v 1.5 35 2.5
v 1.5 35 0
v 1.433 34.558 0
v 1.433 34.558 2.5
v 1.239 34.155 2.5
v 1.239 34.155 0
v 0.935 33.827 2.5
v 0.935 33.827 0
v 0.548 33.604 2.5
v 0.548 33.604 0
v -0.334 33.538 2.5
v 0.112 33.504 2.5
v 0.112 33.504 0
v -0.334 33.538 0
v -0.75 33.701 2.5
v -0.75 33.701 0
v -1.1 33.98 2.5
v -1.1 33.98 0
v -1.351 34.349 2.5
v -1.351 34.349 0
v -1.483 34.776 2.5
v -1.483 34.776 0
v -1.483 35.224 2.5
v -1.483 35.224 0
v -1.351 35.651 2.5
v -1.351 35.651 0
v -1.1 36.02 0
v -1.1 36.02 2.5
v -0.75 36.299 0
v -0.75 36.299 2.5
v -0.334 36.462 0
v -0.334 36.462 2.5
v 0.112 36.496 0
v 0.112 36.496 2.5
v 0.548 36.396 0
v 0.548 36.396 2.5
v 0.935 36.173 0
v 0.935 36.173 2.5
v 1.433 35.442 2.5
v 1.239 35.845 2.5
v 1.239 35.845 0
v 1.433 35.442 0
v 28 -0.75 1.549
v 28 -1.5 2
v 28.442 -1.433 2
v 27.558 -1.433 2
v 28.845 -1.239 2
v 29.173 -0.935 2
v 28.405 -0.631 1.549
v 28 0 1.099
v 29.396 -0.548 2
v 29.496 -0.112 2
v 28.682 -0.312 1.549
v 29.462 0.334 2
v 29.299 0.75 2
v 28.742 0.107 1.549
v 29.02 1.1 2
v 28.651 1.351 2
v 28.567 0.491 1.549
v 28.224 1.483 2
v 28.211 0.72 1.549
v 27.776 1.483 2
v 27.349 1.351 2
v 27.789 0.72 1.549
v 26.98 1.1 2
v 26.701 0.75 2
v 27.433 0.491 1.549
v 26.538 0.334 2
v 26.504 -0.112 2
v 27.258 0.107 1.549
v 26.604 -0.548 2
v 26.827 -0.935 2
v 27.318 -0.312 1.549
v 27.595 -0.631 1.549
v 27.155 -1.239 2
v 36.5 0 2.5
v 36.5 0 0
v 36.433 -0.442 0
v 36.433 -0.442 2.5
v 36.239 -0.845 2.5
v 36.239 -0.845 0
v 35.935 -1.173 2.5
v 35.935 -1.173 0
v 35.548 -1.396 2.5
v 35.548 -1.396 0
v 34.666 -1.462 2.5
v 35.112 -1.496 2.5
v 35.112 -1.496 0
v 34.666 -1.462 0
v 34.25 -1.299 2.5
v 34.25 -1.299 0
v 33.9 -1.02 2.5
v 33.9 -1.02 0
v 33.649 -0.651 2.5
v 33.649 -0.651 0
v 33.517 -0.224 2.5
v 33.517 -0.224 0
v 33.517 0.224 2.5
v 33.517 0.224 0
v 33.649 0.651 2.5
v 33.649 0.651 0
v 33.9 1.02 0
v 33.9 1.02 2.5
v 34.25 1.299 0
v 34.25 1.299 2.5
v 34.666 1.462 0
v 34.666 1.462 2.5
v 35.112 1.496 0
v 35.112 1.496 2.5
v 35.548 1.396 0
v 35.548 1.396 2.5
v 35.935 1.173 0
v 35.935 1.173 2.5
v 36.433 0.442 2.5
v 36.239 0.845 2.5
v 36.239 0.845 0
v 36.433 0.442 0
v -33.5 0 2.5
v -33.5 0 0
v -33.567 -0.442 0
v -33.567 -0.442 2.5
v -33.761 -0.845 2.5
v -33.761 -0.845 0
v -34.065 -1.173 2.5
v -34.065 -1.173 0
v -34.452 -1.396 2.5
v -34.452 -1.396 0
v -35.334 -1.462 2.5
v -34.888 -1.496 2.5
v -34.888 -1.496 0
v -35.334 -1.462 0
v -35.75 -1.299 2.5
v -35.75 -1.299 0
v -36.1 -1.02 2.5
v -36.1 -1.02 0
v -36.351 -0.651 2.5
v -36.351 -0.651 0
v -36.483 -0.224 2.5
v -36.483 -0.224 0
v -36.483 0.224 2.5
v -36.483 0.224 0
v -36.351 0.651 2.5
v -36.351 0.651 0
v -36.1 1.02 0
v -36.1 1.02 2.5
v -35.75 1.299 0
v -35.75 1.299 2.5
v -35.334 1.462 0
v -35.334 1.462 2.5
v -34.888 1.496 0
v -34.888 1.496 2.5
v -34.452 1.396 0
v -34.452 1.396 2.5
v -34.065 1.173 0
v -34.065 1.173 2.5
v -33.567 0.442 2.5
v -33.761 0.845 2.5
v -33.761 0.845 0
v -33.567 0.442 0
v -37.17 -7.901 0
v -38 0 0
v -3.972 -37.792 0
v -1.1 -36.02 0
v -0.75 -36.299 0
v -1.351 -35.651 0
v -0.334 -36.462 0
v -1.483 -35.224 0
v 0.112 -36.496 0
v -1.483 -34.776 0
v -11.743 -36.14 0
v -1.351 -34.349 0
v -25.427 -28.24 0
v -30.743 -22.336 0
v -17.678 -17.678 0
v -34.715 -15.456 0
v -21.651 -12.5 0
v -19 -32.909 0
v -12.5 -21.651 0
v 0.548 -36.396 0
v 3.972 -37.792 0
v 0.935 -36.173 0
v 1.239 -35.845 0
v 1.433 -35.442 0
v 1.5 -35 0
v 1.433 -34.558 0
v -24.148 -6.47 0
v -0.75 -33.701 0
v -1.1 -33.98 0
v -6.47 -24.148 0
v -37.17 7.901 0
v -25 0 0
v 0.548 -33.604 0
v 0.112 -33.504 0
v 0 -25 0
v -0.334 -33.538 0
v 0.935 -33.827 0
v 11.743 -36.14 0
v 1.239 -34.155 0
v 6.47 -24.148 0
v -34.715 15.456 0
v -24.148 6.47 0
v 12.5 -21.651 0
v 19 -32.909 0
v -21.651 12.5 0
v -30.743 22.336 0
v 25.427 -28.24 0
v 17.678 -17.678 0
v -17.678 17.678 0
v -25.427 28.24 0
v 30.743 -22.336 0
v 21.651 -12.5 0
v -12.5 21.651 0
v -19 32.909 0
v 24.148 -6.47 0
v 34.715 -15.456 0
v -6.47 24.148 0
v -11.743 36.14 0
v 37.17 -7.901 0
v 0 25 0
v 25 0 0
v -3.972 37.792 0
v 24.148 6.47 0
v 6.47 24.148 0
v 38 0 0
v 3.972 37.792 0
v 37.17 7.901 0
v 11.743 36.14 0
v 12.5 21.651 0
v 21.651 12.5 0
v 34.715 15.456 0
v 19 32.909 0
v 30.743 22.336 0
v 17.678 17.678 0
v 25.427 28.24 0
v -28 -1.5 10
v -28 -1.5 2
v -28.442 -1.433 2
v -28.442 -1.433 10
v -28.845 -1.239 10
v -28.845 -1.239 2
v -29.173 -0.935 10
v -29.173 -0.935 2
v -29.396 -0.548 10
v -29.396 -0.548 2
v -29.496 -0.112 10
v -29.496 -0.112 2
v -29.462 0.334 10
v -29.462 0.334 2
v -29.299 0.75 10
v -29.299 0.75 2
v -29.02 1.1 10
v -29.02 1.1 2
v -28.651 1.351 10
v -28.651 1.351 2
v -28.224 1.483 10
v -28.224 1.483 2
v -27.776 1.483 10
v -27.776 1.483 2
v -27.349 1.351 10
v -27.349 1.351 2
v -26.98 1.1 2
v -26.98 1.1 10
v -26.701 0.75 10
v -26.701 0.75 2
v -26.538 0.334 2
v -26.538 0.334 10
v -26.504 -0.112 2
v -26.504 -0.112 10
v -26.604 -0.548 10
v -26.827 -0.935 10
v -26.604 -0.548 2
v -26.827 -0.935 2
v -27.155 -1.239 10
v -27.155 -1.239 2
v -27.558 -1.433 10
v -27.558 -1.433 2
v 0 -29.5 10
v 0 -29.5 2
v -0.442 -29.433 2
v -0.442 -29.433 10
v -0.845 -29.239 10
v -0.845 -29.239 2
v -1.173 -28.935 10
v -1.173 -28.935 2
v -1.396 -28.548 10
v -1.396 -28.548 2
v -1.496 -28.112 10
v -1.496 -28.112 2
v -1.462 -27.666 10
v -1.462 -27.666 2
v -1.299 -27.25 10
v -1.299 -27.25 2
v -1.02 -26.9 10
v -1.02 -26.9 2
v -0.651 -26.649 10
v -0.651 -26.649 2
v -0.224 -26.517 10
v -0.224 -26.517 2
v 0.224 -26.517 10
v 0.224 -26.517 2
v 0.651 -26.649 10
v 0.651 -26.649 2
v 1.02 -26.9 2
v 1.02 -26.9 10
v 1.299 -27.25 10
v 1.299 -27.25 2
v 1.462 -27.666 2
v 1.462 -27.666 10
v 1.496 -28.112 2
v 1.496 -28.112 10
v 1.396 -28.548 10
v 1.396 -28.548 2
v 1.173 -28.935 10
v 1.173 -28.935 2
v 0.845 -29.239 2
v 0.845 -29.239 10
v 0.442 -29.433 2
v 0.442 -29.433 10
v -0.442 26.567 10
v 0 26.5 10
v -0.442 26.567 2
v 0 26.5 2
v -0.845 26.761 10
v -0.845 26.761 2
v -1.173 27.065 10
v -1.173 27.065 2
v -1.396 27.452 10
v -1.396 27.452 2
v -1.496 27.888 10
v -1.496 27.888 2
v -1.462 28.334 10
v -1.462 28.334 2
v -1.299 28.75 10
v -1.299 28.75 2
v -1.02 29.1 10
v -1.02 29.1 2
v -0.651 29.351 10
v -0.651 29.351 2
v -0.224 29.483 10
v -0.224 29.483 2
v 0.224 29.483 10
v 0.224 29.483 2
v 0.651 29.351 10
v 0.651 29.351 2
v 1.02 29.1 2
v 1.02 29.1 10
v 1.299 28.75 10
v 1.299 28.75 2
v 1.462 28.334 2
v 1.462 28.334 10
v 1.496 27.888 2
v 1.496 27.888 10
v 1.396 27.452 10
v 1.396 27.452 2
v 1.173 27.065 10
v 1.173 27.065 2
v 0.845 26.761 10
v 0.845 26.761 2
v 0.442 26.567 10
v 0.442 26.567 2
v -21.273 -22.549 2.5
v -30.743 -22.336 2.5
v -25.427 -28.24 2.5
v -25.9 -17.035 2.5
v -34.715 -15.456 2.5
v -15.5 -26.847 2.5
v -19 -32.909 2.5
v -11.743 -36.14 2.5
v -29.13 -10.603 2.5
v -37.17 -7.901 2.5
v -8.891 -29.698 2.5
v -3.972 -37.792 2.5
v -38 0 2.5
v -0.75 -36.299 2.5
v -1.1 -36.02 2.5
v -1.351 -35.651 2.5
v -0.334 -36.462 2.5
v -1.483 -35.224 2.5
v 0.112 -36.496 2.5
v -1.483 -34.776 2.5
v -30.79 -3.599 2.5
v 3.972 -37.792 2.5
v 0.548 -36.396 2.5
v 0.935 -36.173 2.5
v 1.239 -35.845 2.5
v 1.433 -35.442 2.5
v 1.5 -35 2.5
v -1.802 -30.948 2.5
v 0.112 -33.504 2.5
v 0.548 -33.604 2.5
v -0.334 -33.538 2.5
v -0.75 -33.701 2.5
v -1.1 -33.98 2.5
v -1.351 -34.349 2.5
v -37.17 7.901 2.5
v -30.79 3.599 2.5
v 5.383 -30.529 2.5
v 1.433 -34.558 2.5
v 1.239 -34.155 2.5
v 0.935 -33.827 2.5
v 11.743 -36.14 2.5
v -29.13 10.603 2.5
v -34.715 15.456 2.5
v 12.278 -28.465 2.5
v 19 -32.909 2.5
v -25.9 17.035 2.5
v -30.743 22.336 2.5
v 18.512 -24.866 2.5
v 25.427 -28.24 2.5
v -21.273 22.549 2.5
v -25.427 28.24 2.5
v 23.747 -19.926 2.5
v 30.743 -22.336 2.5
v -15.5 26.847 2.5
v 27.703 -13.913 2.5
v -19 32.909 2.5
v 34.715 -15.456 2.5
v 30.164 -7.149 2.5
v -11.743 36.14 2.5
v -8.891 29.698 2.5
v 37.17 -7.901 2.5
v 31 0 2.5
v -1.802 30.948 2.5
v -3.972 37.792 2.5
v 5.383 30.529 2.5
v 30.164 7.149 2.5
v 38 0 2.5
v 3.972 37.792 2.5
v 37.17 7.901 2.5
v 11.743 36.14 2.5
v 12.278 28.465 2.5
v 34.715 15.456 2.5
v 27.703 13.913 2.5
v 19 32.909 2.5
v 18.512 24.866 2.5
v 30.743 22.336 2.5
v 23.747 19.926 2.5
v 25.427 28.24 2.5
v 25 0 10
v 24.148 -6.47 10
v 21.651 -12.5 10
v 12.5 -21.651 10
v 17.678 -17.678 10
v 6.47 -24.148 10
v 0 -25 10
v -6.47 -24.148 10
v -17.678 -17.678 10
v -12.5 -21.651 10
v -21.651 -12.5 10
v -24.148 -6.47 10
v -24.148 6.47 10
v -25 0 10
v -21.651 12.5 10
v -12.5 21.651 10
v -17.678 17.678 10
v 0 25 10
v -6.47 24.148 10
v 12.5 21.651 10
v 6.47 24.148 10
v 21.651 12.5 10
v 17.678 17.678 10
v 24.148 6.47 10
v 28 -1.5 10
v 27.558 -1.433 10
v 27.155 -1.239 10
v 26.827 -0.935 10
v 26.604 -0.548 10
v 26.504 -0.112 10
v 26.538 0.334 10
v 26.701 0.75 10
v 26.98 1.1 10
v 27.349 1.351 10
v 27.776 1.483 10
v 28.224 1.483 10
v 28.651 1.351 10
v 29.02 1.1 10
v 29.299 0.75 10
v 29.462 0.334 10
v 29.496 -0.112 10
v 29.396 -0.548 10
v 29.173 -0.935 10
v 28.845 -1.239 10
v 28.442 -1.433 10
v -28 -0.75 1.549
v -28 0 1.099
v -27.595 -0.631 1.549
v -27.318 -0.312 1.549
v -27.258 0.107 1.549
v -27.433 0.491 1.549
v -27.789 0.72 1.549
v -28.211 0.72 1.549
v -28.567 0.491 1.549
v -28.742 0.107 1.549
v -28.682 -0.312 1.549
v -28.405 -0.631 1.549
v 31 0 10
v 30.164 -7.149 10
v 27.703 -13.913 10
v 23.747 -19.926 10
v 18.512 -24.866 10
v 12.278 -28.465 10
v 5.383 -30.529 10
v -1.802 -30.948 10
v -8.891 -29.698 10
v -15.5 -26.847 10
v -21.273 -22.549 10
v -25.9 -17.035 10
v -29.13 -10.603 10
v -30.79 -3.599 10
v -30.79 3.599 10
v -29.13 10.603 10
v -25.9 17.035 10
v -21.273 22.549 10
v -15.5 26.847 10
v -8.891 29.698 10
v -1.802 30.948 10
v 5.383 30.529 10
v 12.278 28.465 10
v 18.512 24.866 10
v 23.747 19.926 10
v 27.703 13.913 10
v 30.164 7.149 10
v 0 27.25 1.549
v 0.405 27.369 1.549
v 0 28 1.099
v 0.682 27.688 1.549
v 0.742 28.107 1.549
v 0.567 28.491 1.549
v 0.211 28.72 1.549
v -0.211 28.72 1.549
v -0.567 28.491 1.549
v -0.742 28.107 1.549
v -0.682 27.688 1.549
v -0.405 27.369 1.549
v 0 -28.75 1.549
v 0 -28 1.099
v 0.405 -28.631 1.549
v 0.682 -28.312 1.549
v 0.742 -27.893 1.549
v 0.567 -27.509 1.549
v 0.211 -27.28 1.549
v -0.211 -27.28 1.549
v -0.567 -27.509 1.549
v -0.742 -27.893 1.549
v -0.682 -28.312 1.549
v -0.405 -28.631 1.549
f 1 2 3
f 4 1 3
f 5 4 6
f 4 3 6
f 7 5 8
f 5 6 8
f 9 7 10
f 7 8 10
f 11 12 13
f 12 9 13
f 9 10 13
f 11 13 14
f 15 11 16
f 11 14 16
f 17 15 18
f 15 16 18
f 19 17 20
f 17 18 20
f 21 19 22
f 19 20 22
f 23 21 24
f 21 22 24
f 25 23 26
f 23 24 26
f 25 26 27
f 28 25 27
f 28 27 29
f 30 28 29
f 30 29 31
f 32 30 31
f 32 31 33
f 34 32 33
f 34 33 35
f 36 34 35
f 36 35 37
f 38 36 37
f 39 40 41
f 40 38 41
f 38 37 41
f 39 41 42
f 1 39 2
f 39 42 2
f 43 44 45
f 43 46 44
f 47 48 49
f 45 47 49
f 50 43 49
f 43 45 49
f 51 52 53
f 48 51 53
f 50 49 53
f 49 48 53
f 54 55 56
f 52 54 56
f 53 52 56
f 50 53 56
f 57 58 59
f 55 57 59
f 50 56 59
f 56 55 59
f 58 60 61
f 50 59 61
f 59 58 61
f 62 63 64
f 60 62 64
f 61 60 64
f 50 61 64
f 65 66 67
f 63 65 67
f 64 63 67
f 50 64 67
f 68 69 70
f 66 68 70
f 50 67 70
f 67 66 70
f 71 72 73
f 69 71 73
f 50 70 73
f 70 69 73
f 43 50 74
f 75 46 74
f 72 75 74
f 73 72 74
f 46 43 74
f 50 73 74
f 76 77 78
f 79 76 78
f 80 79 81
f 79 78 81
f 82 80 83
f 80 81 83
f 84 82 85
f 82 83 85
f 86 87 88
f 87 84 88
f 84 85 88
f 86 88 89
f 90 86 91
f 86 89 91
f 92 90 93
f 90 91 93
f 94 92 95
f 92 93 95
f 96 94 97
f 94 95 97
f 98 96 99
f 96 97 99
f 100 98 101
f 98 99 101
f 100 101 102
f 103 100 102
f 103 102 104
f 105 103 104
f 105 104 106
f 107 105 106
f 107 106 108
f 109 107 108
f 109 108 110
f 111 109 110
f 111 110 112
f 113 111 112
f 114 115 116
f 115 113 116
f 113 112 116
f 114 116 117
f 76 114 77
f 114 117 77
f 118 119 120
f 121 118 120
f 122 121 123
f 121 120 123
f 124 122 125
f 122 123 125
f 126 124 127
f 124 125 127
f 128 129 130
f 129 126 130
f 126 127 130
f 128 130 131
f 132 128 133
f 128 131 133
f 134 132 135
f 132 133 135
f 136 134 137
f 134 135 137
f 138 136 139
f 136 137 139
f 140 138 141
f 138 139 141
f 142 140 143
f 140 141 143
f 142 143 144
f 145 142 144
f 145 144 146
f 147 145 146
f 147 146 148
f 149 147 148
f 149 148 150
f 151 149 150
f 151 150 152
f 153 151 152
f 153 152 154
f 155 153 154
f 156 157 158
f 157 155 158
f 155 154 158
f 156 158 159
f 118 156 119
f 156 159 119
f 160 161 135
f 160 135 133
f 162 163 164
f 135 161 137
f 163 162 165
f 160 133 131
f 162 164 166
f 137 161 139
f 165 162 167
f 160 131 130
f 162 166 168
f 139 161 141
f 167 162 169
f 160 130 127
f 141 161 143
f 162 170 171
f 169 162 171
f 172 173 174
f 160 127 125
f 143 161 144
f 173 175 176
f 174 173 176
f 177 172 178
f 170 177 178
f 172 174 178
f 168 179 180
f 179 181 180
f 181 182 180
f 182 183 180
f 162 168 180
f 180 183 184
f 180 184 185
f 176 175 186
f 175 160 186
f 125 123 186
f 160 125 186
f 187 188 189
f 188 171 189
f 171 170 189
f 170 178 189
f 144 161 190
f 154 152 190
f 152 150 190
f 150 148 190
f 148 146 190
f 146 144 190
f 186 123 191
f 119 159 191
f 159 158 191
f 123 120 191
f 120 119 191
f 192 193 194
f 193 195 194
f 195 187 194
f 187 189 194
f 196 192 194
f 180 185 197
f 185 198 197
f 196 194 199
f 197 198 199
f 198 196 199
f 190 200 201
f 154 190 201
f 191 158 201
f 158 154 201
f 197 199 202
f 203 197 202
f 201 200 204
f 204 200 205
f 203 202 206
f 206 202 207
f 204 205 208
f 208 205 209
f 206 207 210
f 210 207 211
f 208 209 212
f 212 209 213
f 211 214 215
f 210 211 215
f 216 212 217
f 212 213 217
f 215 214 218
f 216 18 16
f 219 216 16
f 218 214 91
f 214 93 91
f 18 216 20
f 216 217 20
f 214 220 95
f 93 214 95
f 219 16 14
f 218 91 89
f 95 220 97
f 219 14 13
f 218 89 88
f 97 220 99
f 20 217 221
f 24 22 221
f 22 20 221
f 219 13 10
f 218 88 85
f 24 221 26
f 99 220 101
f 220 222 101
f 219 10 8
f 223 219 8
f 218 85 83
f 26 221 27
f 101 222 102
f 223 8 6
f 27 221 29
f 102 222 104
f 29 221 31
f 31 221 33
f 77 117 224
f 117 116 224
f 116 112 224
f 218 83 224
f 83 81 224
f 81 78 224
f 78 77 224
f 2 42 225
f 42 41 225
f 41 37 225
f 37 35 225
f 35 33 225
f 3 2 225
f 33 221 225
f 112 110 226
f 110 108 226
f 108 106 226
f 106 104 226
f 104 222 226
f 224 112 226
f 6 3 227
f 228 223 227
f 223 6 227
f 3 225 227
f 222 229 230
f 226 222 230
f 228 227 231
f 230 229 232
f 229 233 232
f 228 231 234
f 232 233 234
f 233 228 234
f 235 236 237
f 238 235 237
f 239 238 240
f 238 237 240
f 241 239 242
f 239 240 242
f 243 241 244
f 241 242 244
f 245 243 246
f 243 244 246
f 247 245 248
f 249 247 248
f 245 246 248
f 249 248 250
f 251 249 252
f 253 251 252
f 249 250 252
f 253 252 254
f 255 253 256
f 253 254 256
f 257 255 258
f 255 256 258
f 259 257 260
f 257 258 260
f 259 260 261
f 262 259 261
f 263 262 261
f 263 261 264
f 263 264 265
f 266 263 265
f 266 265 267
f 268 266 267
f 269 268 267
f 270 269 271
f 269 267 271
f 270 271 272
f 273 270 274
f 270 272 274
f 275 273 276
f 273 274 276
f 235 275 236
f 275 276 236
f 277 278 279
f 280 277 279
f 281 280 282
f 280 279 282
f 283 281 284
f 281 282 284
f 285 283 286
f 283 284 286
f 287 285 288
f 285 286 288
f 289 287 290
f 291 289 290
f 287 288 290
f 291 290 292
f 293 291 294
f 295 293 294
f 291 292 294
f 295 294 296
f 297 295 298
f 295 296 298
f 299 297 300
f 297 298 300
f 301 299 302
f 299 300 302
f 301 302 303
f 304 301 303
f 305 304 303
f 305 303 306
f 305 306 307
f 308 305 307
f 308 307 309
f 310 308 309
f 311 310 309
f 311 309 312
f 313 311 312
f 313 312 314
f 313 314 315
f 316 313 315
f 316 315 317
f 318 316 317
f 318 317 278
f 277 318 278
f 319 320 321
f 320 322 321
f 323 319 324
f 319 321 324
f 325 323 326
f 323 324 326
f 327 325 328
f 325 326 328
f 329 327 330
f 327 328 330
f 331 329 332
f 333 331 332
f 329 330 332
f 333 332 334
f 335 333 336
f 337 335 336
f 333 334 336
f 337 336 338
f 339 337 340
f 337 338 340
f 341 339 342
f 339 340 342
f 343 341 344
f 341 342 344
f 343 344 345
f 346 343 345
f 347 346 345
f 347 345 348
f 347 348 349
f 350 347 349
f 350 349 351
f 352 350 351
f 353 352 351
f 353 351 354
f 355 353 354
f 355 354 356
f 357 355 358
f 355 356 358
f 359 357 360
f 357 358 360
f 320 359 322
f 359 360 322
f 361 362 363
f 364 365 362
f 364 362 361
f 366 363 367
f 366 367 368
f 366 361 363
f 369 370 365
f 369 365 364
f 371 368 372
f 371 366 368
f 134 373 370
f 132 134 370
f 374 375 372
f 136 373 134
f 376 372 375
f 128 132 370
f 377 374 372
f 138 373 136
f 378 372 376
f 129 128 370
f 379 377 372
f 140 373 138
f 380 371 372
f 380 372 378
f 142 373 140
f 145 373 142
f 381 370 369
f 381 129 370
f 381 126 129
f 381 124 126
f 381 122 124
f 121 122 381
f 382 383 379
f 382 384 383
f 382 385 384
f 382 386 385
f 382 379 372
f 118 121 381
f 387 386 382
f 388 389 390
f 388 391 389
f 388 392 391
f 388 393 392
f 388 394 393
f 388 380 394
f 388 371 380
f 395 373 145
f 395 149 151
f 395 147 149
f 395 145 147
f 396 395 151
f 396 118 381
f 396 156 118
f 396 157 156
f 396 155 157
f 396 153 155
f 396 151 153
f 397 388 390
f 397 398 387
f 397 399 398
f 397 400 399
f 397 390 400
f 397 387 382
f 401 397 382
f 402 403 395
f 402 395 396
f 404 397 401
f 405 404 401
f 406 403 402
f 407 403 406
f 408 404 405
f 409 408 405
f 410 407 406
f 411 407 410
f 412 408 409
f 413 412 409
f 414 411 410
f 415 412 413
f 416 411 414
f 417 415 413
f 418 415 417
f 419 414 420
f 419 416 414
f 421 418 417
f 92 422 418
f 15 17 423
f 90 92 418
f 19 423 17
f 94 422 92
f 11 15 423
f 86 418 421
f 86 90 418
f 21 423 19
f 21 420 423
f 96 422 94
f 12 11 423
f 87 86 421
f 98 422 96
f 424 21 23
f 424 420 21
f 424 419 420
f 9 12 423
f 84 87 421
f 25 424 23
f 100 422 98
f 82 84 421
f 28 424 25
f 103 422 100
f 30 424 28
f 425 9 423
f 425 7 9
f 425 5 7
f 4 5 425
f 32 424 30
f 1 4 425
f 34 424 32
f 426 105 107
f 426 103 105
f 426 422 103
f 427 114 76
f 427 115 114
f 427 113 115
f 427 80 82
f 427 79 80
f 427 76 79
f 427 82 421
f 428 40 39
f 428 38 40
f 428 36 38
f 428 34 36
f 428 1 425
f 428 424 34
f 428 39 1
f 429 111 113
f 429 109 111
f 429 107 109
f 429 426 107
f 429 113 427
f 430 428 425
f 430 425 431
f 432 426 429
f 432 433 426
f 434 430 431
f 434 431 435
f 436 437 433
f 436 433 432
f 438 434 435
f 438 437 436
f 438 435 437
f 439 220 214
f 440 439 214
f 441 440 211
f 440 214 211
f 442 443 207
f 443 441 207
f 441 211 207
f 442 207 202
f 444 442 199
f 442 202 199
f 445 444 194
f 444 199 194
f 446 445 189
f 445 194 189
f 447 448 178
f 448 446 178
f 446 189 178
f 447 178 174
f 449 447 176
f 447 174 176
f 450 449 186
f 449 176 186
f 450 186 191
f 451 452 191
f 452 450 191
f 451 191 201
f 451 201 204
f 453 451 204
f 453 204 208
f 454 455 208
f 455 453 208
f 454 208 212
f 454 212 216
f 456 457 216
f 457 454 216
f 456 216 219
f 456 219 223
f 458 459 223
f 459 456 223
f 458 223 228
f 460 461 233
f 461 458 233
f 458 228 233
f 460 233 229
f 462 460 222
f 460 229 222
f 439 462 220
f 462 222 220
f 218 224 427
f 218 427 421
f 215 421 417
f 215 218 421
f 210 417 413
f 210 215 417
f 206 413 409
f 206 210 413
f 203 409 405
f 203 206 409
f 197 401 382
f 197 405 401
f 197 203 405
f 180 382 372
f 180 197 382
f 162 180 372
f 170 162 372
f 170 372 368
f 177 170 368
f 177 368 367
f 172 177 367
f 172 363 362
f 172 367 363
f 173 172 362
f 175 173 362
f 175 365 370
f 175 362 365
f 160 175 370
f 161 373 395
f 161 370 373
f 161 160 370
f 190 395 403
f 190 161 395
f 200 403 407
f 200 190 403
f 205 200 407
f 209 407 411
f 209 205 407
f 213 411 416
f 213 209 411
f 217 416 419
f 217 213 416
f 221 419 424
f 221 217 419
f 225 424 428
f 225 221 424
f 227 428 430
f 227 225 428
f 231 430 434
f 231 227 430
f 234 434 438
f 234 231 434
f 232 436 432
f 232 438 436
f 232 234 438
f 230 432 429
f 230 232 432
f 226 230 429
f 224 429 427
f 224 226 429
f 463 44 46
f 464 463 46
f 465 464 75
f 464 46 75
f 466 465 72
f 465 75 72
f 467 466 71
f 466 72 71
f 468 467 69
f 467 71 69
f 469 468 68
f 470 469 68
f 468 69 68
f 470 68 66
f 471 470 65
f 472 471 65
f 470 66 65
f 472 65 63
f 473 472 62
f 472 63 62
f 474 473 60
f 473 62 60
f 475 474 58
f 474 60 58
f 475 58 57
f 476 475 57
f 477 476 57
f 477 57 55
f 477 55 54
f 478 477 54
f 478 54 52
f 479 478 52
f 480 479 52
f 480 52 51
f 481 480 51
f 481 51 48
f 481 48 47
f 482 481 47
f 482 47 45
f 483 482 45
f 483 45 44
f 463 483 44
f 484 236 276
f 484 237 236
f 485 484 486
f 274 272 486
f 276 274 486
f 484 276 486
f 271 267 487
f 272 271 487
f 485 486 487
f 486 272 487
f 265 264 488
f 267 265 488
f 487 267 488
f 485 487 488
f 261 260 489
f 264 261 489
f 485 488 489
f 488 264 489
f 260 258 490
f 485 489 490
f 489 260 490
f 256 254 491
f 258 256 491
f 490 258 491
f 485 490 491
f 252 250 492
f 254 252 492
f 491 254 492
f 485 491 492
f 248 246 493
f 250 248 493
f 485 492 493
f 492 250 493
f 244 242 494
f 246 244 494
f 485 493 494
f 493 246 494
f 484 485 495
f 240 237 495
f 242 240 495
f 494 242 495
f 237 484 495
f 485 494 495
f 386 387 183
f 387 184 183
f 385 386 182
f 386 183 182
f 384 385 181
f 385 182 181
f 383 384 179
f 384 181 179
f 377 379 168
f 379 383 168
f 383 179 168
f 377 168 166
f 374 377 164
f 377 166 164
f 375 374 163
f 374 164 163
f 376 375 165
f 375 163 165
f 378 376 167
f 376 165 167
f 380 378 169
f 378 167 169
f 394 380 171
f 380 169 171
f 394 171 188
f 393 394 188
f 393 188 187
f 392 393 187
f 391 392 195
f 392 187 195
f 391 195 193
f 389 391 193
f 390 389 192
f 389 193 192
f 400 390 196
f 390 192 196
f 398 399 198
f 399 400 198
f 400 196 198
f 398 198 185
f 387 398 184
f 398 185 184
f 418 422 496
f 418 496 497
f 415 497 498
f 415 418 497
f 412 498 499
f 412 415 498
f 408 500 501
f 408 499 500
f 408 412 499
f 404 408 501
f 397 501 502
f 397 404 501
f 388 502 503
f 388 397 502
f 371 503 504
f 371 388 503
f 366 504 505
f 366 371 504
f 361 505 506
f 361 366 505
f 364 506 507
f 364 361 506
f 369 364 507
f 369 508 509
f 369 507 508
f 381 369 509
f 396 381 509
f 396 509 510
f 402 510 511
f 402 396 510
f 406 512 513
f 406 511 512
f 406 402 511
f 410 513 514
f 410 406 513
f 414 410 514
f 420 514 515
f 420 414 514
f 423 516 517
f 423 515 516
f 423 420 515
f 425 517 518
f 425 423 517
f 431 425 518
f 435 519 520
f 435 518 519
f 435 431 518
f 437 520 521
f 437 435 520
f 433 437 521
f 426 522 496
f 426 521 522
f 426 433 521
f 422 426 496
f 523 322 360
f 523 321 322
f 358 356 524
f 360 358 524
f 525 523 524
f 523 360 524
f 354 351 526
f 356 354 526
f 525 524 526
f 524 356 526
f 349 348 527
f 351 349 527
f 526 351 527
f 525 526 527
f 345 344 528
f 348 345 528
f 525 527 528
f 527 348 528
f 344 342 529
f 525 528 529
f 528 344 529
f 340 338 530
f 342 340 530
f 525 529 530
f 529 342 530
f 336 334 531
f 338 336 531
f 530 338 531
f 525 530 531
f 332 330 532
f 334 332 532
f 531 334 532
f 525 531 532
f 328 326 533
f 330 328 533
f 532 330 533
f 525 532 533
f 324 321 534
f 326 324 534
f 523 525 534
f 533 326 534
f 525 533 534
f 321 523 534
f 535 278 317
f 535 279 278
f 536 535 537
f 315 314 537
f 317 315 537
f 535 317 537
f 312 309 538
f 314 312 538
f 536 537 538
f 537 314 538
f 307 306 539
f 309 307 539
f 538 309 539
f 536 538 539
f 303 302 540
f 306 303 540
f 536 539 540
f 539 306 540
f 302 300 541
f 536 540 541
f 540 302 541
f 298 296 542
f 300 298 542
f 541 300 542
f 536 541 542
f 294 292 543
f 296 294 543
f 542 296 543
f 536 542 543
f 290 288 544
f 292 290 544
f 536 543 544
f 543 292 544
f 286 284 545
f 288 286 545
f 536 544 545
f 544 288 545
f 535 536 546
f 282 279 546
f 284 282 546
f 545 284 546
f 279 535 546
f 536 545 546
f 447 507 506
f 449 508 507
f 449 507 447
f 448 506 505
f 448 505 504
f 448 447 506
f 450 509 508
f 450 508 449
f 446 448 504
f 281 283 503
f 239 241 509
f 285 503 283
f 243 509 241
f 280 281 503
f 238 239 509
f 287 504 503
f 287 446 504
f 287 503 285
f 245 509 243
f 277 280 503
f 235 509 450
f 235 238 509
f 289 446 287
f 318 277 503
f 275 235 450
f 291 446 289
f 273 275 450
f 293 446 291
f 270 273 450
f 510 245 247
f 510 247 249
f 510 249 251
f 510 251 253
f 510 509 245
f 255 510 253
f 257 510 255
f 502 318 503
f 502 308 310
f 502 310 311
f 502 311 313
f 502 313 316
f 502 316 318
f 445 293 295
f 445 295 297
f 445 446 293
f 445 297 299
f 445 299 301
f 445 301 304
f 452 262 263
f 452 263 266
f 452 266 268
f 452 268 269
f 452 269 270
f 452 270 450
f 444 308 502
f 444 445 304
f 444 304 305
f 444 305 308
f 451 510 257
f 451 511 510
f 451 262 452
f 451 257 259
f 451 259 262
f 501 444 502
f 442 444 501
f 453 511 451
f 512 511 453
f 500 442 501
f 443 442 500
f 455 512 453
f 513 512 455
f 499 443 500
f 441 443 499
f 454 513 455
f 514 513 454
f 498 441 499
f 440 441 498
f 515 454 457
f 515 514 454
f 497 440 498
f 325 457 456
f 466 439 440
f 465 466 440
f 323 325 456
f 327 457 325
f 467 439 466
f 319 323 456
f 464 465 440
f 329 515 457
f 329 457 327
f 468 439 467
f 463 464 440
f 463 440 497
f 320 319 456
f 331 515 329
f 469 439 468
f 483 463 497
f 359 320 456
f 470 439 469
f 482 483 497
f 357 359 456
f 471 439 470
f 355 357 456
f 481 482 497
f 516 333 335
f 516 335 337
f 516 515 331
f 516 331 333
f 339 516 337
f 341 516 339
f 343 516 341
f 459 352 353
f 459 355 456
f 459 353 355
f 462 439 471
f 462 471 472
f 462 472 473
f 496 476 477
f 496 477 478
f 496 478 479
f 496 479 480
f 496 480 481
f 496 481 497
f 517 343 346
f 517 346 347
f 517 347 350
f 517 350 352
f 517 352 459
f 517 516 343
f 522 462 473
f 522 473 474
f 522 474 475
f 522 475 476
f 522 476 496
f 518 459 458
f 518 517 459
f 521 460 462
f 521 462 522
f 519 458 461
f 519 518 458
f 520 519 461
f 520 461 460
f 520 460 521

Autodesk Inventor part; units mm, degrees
ref_plane "YZ Plane" through (0, 0, 0) normal (1, 0, 0) x (0, 1, 0)
ref_plane "XZ Plane" through (0, 0, 0) normal (0, 1, 0) x (-1, 0, 0)
ref_plane "XY Plane" through (0, 0, 0) normal (0, 0, 1) x (1, 0, 0)
sketch "스케치1" plane through (0, 0, 0) normal (0, 0, 1) x (1, 0, 0)
  circle A0 centre (0, 0) radius 25
  circle A1 centre (-35, 0) radius 1.5
  circle A2 centre (0, 0) radius 31
  circle A3 centre (0, 0) radius 38
  circle A4 centre (0, -35) radius 1.5
  circle A5 centre (35, 0) radius 1.5
  circle A6 centre (0, 35) radius 1.5
  dimension "d0" = 50
  dimension "d2" = 3
  dimension "d4" = 6
  dimension "d27" = 1.5
  dimension "d28" = 35
  dimension "d31" = 360
extrude "돌출1" add sketch "스케치1" along normal blind 2.5 contours A3
extrude "돌출2" add sketch "스케치1" along normal blind 10 contours A2
sketch "스케치2" plane through (0, 0, 10) normal (0, 0, 1) x (1, 0, 0)
  circle A0 centre (0, 0) radius 25 projected
  circle A1 centre (0, 0) radius 31 projected
  line L0 (-1.611, 31) -> (1.611, 31)
  point P0 (0, 28)
  point P1 (0, 31)
  point P2 (-28, 0)
  point P3 (0, -28)
  point P4 (28, 0)
  dimension "d14" = 6
  dimension "d15" = 3
  dimension "d18" = 360
hole "구멍1" at (0, 28, 10) at (-28, 0, 10) at (0, -28, 10) at (28, 0, 10) direction (0, 0, -1) diameter 3 depth 8 tip angle 118
equation "\"d15\" = 0.5 * d14"
properties part number "ModuleConnector"
